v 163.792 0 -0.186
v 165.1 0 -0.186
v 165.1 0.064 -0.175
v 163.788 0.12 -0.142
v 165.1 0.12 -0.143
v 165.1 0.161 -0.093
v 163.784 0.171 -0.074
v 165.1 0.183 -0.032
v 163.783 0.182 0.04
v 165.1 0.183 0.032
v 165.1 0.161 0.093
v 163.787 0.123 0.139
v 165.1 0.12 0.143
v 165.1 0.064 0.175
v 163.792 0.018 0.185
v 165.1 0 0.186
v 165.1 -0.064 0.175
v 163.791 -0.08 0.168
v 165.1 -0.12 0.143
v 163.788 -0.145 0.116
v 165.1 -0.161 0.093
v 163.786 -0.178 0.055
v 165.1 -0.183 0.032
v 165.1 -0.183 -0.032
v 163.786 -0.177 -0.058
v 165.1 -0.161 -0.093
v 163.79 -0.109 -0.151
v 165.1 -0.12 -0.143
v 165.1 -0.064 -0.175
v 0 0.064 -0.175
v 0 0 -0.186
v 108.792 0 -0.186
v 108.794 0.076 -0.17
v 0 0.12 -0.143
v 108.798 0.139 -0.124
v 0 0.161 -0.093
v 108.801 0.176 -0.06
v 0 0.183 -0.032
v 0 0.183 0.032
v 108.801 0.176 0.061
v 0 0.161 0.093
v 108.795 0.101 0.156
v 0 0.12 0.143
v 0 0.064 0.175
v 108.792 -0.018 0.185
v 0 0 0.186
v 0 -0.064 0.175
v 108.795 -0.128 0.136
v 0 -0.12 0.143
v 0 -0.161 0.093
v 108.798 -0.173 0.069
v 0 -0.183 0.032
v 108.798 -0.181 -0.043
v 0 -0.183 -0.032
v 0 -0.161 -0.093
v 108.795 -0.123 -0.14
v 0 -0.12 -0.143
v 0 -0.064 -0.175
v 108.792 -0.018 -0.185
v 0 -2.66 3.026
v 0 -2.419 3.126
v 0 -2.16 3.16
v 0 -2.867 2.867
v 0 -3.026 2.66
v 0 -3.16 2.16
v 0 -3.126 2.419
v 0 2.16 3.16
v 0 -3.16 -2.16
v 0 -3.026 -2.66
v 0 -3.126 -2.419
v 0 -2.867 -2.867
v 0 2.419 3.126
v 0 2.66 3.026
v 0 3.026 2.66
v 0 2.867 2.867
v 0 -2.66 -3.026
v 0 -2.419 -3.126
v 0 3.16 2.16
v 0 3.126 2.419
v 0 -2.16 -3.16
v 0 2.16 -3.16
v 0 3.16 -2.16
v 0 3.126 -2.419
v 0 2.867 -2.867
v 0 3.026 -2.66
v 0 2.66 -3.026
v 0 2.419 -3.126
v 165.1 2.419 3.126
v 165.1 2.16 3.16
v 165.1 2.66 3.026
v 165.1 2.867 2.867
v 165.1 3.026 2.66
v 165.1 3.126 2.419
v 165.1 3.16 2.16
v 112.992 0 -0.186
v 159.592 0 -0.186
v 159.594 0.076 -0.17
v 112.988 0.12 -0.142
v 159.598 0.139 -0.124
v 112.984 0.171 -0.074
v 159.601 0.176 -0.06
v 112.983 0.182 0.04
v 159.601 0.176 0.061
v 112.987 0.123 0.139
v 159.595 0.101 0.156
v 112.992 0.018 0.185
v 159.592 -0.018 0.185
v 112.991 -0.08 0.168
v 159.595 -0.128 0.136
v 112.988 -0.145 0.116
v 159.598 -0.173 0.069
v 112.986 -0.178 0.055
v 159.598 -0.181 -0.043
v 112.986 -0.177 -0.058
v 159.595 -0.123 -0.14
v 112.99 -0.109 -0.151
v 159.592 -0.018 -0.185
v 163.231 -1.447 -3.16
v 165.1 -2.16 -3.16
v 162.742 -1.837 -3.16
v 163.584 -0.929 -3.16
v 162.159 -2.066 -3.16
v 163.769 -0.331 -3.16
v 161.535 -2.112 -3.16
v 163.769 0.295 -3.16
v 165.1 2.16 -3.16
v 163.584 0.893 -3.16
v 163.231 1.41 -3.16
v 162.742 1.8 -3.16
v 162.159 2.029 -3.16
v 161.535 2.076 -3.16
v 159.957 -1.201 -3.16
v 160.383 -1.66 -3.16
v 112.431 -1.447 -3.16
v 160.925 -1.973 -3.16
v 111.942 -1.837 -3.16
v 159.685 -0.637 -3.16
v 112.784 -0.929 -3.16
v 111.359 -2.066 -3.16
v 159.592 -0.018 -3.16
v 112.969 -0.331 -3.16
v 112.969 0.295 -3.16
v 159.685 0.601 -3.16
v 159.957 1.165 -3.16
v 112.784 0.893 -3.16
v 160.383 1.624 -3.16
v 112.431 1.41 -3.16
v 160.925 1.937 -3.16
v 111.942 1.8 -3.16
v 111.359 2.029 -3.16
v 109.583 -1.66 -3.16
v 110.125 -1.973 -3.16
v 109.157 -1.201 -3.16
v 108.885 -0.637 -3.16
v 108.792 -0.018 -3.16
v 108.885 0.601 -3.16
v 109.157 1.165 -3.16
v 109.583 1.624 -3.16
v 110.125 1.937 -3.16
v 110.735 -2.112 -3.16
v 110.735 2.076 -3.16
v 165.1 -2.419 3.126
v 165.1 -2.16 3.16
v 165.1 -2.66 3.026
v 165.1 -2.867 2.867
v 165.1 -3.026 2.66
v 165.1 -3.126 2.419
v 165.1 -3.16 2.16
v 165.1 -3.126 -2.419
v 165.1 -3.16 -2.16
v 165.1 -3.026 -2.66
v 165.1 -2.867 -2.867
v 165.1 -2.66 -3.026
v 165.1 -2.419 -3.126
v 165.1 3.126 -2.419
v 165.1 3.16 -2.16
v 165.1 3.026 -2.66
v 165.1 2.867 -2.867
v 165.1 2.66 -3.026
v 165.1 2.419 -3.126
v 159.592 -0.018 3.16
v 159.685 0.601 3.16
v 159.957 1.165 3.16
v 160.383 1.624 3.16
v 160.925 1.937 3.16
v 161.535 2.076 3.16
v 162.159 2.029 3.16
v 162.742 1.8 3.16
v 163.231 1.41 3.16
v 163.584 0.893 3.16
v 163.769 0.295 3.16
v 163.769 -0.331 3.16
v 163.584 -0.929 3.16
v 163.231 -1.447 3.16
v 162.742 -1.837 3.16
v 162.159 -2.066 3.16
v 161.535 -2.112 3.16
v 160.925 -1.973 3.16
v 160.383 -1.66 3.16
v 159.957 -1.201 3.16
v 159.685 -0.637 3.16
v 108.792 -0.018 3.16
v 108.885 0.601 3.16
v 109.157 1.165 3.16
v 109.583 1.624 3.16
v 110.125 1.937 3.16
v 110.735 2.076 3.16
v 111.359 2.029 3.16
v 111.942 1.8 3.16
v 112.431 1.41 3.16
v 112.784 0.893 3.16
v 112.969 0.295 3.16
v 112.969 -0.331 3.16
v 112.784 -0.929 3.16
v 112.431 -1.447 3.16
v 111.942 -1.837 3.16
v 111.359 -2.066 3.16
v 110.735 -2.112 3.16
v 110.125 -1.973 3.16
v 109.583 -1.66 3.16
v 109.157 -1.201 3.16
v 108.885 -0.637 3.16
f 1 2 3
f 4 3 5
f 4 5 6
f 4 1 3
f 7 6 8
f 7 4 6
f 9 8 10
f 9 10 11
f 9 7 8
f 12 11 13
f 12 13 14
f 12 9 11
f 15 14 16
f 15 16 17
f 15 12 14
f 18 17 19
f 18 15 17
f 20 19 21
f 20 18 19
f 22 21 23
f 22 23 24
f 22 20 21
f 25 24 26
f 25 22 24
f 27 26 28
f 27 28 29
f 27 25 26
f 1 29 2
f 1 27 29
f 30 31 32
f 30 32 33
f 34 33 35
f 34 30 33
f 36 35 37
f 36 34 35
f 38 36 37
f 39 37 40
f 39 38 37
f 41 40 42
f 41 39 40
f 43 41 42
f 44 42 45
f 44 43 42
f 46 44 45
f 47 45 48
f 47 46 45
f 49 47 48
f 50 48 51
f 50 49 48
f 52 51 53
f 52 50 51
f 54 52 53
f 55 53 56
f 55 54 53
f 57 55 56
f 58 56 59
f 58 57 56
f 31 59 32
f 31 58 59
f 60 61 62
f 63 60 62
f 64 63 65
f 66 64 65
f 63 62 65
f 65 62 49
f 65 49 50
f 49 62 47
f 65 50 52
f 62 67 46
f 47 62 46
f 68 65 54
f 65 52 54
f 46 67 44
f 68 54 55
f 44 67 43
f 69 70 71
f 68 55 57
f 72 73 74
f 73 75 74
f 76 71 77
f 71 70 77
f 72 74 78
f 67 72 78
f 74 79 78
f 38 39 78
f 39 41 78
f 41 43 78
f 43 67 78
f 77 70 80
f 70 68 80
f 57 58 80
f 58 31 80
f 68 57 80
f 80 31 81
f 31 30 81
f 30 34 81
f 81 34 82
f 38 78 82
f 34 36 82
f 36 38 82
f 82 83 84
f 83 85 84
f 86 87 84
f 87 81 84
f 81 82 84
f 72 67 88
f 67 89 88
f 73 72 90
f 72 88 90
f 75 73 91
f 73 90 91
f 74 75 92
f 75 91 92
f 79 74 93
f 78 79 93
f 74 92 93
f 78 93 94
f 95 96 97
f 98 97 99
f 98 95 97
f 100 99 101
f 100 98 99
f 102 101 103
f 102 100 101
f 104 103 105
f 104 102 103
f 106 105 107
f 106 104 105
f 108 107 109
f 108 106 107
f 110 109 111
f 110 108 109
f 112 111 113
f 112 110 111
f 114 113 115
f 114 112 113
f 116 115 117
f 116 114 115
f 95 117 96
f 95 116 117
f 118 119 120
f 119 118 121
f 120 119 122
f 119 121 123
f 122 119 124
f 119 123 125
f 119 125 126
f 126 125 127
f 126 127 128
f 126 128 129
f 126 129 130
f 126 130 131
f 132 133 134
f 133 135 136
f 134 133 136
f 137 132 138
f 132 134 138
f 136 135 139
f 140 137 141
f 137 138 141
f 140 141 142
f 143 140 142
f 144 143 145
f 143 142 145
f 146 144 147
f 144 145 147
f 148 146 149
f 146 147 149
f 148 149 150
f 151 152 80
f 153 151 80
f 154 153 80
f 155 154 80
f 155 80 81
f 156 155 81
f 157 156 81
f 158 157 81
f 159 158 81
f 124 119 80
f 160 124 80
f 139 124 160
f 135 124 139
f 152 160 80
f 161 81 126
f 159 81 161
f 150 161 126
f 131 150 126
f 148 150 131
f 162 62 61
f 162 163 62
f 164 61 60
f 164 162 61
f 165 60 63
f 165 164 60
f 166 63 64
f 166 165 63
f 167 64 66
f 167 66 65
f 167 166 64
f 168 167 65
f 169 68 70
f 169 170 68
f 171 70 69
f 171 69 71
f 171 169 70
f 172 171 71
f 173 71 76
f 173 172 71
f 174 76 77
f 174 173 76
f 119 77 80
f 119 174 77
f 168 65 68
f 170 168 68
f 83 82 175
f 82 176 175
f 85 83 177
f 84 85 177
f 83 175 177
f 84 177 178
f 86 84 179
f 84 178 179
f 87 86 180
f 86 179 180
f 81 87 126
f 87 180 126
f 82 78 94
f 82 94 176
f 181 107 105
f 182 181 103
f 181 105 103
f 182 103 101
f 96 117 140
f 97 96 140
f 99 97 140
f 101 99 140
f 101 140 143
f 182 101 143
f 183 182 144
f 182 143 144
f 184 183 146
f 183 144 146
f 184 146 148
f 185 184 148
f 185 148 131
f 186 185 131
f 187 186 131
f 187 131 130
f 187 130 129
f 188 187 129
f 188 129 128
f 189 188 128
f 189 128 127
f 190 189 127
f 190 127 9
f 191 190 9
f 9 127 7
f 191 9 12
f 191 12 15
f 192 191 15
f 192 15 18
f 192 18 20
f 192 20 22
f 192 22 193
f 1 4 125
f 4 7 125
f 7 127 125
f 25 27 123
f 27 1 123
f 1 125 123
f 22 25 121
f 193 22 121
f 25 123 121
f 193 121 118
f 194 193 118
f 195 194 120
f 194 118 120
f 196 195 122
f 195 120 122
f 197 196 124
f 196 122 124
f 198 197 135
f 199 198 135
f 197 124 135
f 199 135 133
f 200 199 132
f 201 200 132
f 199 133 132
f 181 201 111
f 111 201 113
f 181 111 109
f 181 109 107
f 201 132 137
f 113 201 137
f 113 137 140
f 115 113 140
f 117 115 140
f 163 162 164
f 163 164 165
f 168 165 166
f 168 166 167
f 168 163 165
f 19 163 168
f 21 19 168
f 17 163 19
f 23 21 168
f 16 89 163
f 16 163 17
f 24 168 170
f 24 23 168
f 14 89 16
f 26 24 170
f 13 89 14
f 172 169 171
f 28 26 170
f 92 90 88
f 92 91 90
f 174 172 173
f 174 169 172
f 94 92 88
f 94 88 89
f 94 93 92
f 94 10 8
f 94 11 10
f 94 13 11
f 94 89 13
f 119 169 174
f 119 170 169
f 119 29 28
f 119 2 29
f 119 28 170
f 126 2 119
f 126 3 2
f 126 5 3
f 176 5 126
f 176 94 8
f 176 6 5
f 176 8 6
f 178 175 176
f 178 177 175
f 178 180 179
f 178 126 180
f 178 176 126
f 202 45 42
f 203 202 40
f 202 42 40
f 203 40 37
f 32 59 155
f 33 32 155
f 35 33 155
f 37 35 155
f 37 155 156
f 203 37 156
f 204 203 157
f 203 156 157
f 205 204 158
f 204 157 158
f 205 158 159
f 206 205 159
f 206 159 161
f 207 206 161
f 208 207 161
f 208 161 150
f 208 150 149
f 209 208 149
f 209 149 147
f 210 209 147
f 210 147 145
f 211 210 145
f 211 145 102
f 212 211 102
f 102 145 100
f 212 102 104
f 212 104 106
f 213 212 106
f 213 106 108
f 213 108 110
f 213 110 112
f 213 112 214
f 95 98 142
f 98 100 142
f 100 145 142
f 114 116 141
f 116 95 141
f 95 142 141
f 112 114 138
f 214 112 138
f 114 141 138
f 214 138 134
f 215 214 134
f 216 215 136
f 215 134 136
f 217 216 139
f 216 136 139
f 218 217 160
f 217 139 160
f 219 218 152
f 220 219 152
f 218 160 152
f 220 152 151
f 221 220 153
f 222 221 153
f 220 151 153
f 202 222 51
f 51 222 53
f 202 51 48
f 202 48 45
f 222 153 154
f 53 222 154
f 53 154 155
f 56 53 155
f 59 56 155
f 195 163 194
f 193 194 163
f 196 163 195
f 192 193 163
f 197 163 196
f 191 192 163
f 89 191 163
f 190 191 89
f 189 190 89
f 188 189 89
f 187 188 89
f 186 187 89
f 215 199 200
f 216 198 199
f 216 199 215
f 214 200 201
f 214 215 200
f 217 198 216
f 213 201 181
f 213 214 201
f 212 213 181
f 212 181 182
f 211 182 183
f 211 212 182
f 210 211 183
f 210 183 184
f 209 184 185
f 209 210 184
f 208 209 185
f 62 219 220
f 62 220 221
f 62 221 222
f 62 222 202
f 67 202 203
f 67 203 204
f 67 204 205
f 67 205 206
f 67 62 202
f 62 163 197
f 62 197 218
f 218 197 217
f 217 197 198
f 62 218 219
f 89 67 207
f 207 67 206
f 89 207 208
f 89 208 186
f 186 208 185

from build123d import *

# Parameters (mm, degrees)
SKETCH_1_W          = 6.32
SKETCH_1_H          = 6.32
SKETCH_1_R          = 0.1861223
EXTRUDE_1_DEPTH     = 165.1
FILLET_1_R          = 1
SKETCH_2_R          = 2.1
CUT_EXTRUDE_1_DEPTH = 165.1


with BuildPart() as part:
    # 草图1 → 凸台-拉伸1 (new body)
    with BuildSketch(Plane(origin=(0, 0, 0), x_dir=(0, 0, -1), z_dir=(1, 0, 0))):
        Rectangle(SKETCH_1_W, SKETCH_1_H)
        Circle(SKETCH_1_R, mode=Mode.SUBTRACT)
    extrude(amount=EXTRUDE_1_DEPTH)

    # 圆角1
    fillet_1_edges = [part.edges().sort_by_distance(p)[0] for p in [
        (82.55, -3.16, -3.16),
        (82.55, -3.16, 3.16),
        (82.55, 3.16, 3.16),
        (82.55, 3.16, -3.16),
    ]]
    fillet(fillet_1_edges, radius=FILLET_1_R)

    # 草图2 → 切除-拉伸1 (cut)
    with BuildSketch(Plane(origin=(0, 0, -3.16), x_dir=(-1, 0, 0), z_dir=(0, 0, -1))):
        with Locations((-161.692066873, -0.018189101)):
            Circle(SKETCH_2_R)
        with Locations((-110.892066873, -0.018189101)):
            Circle(SKETCH_2_R)
    extrude(amount=-CUT_EXTRUDE_1_DEPTH, mode=Mode.SUBTRACT)


solid = part.part
